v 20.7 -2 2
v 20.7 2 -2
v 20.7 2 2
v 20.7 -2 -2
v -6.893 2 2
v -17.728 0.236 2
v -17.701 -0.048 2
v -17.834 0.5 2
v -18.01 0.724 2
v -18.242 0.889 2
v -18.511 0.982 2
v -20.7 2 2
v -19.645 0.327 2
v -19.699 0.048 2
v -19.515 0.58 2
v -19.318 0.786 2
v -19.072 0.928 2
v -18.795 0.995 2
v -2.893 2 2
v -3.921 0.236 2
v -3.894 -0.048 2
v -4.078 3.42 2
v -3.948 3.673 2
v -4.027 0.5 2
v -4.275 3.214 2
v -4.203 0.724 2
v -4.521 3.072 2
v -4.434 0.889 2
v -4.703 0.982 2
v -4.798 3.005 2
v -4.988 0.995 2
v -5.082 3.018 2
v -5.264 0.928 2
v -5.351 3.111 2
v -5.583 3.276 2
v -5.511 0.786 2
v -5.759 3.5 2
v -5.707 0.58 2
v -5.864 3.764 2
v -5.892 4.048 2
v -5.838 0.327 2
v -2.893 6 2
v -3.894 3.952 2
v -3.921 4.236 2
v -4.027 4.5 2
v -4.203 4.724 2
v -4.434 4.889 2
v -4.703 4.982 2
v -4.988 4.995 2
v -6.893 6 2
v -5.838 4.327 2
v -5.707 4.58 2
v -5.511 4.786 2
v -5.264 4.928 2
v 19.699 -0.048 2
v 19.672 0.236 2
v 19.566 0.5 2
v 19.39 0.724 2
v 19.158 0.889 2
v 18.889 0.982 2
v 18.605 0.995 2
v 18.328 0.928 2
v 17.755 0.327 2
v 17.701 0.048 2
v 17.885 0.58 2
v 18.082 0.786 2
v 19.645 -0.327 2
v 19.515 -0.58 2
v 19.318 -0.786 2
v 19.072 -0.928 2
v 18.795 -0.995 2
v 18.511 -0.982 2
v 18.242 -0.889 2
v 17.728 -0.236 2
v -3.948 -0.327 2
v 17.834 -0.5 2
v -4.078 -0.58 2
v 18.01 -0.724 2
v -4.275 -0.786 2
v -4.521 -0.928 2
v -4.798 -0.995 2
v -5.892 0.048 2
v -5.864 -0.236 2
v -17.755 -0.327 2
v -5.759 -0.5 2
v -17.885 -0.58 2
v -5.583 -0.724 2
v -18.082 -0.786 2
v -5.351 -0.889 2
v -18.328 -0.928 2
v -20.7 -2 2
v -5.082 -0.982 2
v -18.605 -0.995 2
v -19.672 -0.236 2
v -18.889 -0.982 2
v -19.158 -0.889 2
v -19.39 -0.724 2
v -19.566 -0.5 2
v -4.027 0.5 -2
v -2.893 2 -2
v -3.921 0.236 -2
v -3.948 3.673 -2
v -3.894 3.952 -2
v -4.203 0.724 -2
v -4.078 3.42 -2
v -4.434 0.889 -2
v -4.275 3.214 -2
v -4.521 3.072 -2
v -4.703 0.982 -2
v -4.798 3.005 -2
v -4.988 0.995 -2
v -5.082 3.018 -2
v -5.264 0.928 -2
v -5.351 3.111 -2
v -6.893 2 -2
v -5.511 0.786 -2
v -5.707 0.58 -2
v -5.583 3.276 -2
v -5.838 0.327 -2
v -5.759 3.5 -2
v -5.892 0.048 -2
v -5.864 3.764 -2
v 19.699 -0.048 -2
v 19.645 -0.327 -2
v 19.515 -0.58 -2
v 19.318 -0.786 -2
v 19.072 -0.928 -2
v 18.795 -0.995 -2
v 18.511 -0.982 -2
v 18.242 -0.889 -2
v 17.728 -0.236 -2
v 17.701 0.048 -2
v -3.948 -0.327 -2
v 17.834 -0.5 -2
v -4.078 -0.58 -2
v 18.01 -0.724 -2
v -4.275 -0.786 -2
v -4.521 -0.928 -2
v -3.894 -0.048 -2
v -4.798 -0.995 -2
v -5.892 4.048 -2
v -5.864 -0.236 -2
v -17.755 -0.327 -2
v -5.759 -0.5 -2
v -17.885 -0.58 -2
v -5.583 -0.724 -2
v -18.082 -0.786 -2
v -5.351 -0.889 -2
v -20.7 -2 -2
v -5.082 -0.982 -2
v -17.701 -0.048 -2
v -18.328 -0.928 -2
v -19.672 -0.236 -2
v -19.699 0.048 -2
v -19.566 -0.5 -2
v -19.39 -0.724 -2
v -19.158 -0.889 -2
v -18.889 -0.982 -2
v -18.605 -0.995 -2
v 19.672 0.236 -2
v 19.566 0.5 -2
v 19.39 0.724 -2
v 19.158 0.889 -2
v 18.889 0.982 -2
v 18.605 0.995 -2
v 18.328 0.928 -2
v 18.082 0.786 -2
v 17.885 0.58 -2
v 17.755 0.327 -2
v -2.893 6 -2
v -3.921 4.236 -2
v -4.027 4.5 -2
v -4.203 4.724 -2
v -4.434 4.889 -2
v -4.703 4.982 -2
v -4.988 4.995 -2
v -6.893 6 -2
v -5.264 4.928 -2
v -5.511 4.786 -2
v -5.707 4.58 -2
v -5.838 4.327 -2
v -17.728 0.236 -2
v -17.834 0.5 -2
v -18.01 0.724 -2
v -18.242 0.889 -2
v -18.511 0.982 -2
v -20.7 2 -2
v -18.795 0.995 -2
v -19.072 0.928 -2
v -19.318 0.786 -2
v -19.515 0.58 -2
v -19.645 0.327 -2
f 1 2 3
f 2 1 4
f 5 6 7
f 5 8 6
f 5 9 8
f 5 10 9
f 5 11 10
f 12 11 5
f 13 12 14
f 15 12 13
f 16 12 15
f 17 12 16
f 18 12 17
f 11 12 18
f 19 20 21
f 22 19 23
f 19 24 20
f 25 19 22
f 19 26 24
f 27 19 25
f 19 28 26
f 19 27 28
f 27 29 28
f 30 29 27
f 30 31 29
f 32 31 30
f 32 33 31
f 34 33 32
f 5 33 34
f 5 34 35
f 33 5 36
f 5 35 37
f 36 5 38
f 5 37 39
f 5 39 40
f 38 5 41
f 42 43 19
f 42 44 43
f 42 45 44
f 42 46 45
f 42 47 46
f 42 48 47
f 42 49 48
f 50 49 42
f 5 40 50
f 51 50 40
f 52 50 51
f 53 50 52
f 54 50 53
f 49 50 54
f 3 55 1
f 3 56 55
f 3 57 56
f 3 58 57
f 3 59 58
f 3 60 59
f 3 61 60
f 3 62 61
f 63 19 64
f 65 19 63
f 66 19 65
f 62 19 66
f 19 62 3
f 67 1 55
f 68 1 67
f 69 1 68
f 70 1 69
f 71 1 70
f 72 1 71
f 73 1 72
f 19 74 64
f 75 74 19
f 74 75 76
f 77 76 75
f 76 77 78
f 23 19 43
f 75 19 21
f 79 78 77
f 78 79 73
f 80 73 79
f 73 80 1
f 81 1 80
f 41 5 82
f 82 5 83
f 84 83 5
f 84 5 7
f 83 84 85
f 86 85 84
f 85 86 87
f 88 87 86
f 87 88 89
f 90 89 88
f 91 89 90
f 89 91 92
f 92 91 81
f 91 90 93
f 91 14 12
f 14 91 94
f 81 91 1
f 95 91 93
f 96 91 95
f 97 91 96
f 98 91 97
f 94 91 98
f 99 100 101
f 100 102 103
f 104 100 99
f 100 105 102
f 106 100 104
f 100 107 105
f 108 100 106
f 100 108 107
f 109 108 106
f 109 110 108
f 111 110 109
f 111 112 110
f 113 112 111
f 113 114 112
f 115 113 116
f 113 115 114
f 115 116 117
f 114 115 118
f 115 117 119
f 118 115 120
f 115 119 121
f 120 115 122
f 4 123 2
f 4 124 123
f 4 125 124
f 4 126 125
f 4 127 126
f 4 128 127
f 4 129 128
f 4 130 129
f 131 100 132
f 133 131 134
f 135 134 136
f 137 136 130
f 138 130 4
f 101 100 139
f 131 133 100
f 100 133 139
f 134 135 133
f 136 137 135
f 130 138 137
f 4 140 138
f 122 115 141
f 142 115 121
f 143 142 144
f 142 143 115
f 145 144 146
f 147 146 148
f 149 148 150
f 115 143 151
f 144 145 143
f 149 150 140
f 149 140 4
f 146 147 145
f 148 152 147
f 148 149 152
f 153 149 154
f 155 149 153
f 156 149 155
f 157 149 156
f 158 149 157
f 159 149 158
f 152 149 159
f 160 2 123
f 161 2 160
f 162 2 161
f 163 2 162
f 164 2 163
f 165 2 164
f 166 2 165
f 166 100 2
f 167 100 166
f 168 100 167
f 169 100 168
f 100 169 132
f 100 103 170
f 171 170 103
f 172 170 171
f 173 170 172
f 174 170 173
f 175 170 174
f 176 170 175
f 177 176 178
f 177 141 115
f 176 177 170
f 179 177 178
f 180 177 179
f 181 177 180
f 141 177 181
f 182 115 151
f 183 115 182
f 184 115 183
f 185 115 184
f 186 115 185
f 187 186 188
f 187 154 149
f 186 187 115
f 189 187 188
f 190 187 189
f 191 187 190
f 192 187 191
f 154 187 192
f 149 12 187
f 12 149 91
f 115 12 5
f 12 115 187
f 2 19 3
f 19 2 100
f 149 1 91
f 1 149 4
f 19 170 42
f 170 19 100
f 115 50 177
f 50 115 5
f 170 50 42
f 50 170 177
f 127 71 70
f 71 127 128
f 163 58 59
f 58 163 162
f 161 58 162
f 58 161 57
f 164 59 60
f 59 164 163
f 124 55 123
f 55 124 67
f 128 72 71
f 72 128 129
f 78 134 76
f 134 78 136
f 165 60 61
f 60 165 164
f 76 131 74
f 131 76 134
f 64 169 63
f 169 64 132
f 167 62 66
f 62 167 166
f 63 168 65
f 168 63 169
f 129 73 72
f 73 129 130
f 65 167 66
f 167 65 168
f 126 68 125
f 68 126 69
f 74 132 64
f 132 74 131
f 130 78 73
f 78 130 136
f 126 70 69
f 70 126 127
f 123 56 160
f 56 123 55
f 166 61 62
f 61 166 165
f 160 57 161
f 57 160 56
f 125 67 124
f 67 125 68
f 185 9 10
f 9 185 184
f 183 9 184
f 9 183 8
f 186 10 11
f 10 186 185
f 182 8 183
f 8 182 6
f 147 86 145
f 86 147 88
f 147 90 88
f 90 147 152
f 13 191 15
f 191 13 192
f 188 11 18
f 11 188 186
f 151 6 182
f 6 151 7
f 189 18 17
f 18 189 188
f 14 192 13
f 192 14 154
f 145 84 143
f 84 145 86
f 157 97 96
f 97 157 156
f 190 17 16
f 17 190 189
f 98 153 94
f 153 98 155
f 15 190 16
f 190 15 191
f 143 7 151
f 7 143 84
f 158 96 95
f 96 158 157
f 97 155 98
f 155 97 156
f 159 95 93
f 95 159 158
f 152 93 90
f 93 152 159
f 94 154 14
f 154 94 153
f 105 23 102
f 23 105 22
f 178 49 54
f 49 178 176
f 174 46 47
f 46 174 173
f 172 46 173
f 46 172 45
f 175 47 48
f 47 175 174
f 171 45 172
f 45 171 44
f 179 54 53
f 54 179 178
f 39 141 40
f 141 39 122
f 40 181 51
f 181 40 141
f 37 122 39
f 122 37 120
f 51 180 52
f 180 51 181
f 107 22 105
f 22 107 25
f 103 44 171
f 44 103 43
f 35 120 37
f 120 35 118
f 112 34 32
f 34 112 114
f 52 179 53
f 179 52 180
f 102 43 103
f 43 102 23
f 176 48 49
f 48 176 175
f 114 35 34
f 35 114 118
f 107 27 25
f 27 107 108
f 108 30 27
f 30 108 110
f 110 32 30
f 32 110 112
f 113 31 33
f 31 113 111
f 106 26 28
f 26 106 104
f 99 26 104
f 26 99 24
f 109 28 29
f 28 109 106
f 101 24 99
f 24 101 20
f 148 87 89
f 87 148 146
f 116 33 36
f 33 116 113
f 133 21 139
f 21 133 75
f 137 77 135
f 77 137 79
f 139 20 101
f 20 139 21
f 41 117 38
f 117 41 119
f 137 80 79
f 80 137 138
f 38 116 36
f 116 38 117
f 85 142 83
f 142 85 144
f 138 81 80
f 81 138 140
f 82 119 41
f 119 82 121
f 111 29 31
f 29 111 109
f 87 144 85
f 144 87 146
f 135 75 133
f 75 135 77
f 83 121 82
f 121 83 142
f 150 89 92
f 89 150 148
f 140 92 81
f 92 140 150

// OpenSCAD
//
// Parametric mobile base V1
//
// equation: m1*a+0.5*a*q*a*ro = m2*b+0.5*b*q*b*ro
// 
//

length = 37.4;	// distance between endpoint fixtures
hole = 1;		// fixture hole radius

m1 =9.2;		// weigth #1
m2 = 16;		// weigth #2
sy=4;			// y thickness
sz=4;			// z thickness
alt = 4*hole;	// altitude of center fixture

ro=1.320/1000	;		 // gramm/mm^3 of PLA

detail=22; 				// details



q=sy*sz;
s= length*(0.5-1/(1+m1/m2));					 // simple one for heavy weights m1/m2, not used
s2= 0.5*length-(length*m2+0.5*length*length*q*ro)/(m1+m2+length*q*ro); //more exact placement

difference (){
	union(){
		cube ([hole*4+length,sy,sz],center=true);
		translate([s2,alt/2,0]) cube ([hole*4,alt+hole*4,sz],center=true);
		}
translate ([length/2,0,0]) rotate([0,0,30]) cylinder (h=2*sz, r=hole, center=true, $fn=detail); // cut m1 fixture
translate ([-length/2,0,0]) rotate([0,0,30]) cylinder (h=2*sz, r=hole, center=true, $fn=detail); // cut m2 fixture
translate ([s2,alt,0]) rotate([0,0,30]) cylinder (h=2*sz, r=hole, center=true, $fn=detail);  // cut center top fixture
translate ([s2,0,0]) rotate([0,0,30]) cylinder (h=2*sz, r=hole, center=true, $fn=detail);  // cut center bottom fixture

//#translate ([s2,alt+hole*2,0]) rotate([90,00,00]) cylinder (h=4*hole, r=hole, center=true, $fn=detail);
//#translate ([-length/2,-hole*2,0] ) rotate([90,00,00]) cylinder (h=4*hole, r=hole, center=true, $fn=detail);
//#translate ([length/2,-hole*2,0] ) rotate([90,00,00]) cylinder (h=4*hole, r=hole, center=true, $fn=detail);
}
